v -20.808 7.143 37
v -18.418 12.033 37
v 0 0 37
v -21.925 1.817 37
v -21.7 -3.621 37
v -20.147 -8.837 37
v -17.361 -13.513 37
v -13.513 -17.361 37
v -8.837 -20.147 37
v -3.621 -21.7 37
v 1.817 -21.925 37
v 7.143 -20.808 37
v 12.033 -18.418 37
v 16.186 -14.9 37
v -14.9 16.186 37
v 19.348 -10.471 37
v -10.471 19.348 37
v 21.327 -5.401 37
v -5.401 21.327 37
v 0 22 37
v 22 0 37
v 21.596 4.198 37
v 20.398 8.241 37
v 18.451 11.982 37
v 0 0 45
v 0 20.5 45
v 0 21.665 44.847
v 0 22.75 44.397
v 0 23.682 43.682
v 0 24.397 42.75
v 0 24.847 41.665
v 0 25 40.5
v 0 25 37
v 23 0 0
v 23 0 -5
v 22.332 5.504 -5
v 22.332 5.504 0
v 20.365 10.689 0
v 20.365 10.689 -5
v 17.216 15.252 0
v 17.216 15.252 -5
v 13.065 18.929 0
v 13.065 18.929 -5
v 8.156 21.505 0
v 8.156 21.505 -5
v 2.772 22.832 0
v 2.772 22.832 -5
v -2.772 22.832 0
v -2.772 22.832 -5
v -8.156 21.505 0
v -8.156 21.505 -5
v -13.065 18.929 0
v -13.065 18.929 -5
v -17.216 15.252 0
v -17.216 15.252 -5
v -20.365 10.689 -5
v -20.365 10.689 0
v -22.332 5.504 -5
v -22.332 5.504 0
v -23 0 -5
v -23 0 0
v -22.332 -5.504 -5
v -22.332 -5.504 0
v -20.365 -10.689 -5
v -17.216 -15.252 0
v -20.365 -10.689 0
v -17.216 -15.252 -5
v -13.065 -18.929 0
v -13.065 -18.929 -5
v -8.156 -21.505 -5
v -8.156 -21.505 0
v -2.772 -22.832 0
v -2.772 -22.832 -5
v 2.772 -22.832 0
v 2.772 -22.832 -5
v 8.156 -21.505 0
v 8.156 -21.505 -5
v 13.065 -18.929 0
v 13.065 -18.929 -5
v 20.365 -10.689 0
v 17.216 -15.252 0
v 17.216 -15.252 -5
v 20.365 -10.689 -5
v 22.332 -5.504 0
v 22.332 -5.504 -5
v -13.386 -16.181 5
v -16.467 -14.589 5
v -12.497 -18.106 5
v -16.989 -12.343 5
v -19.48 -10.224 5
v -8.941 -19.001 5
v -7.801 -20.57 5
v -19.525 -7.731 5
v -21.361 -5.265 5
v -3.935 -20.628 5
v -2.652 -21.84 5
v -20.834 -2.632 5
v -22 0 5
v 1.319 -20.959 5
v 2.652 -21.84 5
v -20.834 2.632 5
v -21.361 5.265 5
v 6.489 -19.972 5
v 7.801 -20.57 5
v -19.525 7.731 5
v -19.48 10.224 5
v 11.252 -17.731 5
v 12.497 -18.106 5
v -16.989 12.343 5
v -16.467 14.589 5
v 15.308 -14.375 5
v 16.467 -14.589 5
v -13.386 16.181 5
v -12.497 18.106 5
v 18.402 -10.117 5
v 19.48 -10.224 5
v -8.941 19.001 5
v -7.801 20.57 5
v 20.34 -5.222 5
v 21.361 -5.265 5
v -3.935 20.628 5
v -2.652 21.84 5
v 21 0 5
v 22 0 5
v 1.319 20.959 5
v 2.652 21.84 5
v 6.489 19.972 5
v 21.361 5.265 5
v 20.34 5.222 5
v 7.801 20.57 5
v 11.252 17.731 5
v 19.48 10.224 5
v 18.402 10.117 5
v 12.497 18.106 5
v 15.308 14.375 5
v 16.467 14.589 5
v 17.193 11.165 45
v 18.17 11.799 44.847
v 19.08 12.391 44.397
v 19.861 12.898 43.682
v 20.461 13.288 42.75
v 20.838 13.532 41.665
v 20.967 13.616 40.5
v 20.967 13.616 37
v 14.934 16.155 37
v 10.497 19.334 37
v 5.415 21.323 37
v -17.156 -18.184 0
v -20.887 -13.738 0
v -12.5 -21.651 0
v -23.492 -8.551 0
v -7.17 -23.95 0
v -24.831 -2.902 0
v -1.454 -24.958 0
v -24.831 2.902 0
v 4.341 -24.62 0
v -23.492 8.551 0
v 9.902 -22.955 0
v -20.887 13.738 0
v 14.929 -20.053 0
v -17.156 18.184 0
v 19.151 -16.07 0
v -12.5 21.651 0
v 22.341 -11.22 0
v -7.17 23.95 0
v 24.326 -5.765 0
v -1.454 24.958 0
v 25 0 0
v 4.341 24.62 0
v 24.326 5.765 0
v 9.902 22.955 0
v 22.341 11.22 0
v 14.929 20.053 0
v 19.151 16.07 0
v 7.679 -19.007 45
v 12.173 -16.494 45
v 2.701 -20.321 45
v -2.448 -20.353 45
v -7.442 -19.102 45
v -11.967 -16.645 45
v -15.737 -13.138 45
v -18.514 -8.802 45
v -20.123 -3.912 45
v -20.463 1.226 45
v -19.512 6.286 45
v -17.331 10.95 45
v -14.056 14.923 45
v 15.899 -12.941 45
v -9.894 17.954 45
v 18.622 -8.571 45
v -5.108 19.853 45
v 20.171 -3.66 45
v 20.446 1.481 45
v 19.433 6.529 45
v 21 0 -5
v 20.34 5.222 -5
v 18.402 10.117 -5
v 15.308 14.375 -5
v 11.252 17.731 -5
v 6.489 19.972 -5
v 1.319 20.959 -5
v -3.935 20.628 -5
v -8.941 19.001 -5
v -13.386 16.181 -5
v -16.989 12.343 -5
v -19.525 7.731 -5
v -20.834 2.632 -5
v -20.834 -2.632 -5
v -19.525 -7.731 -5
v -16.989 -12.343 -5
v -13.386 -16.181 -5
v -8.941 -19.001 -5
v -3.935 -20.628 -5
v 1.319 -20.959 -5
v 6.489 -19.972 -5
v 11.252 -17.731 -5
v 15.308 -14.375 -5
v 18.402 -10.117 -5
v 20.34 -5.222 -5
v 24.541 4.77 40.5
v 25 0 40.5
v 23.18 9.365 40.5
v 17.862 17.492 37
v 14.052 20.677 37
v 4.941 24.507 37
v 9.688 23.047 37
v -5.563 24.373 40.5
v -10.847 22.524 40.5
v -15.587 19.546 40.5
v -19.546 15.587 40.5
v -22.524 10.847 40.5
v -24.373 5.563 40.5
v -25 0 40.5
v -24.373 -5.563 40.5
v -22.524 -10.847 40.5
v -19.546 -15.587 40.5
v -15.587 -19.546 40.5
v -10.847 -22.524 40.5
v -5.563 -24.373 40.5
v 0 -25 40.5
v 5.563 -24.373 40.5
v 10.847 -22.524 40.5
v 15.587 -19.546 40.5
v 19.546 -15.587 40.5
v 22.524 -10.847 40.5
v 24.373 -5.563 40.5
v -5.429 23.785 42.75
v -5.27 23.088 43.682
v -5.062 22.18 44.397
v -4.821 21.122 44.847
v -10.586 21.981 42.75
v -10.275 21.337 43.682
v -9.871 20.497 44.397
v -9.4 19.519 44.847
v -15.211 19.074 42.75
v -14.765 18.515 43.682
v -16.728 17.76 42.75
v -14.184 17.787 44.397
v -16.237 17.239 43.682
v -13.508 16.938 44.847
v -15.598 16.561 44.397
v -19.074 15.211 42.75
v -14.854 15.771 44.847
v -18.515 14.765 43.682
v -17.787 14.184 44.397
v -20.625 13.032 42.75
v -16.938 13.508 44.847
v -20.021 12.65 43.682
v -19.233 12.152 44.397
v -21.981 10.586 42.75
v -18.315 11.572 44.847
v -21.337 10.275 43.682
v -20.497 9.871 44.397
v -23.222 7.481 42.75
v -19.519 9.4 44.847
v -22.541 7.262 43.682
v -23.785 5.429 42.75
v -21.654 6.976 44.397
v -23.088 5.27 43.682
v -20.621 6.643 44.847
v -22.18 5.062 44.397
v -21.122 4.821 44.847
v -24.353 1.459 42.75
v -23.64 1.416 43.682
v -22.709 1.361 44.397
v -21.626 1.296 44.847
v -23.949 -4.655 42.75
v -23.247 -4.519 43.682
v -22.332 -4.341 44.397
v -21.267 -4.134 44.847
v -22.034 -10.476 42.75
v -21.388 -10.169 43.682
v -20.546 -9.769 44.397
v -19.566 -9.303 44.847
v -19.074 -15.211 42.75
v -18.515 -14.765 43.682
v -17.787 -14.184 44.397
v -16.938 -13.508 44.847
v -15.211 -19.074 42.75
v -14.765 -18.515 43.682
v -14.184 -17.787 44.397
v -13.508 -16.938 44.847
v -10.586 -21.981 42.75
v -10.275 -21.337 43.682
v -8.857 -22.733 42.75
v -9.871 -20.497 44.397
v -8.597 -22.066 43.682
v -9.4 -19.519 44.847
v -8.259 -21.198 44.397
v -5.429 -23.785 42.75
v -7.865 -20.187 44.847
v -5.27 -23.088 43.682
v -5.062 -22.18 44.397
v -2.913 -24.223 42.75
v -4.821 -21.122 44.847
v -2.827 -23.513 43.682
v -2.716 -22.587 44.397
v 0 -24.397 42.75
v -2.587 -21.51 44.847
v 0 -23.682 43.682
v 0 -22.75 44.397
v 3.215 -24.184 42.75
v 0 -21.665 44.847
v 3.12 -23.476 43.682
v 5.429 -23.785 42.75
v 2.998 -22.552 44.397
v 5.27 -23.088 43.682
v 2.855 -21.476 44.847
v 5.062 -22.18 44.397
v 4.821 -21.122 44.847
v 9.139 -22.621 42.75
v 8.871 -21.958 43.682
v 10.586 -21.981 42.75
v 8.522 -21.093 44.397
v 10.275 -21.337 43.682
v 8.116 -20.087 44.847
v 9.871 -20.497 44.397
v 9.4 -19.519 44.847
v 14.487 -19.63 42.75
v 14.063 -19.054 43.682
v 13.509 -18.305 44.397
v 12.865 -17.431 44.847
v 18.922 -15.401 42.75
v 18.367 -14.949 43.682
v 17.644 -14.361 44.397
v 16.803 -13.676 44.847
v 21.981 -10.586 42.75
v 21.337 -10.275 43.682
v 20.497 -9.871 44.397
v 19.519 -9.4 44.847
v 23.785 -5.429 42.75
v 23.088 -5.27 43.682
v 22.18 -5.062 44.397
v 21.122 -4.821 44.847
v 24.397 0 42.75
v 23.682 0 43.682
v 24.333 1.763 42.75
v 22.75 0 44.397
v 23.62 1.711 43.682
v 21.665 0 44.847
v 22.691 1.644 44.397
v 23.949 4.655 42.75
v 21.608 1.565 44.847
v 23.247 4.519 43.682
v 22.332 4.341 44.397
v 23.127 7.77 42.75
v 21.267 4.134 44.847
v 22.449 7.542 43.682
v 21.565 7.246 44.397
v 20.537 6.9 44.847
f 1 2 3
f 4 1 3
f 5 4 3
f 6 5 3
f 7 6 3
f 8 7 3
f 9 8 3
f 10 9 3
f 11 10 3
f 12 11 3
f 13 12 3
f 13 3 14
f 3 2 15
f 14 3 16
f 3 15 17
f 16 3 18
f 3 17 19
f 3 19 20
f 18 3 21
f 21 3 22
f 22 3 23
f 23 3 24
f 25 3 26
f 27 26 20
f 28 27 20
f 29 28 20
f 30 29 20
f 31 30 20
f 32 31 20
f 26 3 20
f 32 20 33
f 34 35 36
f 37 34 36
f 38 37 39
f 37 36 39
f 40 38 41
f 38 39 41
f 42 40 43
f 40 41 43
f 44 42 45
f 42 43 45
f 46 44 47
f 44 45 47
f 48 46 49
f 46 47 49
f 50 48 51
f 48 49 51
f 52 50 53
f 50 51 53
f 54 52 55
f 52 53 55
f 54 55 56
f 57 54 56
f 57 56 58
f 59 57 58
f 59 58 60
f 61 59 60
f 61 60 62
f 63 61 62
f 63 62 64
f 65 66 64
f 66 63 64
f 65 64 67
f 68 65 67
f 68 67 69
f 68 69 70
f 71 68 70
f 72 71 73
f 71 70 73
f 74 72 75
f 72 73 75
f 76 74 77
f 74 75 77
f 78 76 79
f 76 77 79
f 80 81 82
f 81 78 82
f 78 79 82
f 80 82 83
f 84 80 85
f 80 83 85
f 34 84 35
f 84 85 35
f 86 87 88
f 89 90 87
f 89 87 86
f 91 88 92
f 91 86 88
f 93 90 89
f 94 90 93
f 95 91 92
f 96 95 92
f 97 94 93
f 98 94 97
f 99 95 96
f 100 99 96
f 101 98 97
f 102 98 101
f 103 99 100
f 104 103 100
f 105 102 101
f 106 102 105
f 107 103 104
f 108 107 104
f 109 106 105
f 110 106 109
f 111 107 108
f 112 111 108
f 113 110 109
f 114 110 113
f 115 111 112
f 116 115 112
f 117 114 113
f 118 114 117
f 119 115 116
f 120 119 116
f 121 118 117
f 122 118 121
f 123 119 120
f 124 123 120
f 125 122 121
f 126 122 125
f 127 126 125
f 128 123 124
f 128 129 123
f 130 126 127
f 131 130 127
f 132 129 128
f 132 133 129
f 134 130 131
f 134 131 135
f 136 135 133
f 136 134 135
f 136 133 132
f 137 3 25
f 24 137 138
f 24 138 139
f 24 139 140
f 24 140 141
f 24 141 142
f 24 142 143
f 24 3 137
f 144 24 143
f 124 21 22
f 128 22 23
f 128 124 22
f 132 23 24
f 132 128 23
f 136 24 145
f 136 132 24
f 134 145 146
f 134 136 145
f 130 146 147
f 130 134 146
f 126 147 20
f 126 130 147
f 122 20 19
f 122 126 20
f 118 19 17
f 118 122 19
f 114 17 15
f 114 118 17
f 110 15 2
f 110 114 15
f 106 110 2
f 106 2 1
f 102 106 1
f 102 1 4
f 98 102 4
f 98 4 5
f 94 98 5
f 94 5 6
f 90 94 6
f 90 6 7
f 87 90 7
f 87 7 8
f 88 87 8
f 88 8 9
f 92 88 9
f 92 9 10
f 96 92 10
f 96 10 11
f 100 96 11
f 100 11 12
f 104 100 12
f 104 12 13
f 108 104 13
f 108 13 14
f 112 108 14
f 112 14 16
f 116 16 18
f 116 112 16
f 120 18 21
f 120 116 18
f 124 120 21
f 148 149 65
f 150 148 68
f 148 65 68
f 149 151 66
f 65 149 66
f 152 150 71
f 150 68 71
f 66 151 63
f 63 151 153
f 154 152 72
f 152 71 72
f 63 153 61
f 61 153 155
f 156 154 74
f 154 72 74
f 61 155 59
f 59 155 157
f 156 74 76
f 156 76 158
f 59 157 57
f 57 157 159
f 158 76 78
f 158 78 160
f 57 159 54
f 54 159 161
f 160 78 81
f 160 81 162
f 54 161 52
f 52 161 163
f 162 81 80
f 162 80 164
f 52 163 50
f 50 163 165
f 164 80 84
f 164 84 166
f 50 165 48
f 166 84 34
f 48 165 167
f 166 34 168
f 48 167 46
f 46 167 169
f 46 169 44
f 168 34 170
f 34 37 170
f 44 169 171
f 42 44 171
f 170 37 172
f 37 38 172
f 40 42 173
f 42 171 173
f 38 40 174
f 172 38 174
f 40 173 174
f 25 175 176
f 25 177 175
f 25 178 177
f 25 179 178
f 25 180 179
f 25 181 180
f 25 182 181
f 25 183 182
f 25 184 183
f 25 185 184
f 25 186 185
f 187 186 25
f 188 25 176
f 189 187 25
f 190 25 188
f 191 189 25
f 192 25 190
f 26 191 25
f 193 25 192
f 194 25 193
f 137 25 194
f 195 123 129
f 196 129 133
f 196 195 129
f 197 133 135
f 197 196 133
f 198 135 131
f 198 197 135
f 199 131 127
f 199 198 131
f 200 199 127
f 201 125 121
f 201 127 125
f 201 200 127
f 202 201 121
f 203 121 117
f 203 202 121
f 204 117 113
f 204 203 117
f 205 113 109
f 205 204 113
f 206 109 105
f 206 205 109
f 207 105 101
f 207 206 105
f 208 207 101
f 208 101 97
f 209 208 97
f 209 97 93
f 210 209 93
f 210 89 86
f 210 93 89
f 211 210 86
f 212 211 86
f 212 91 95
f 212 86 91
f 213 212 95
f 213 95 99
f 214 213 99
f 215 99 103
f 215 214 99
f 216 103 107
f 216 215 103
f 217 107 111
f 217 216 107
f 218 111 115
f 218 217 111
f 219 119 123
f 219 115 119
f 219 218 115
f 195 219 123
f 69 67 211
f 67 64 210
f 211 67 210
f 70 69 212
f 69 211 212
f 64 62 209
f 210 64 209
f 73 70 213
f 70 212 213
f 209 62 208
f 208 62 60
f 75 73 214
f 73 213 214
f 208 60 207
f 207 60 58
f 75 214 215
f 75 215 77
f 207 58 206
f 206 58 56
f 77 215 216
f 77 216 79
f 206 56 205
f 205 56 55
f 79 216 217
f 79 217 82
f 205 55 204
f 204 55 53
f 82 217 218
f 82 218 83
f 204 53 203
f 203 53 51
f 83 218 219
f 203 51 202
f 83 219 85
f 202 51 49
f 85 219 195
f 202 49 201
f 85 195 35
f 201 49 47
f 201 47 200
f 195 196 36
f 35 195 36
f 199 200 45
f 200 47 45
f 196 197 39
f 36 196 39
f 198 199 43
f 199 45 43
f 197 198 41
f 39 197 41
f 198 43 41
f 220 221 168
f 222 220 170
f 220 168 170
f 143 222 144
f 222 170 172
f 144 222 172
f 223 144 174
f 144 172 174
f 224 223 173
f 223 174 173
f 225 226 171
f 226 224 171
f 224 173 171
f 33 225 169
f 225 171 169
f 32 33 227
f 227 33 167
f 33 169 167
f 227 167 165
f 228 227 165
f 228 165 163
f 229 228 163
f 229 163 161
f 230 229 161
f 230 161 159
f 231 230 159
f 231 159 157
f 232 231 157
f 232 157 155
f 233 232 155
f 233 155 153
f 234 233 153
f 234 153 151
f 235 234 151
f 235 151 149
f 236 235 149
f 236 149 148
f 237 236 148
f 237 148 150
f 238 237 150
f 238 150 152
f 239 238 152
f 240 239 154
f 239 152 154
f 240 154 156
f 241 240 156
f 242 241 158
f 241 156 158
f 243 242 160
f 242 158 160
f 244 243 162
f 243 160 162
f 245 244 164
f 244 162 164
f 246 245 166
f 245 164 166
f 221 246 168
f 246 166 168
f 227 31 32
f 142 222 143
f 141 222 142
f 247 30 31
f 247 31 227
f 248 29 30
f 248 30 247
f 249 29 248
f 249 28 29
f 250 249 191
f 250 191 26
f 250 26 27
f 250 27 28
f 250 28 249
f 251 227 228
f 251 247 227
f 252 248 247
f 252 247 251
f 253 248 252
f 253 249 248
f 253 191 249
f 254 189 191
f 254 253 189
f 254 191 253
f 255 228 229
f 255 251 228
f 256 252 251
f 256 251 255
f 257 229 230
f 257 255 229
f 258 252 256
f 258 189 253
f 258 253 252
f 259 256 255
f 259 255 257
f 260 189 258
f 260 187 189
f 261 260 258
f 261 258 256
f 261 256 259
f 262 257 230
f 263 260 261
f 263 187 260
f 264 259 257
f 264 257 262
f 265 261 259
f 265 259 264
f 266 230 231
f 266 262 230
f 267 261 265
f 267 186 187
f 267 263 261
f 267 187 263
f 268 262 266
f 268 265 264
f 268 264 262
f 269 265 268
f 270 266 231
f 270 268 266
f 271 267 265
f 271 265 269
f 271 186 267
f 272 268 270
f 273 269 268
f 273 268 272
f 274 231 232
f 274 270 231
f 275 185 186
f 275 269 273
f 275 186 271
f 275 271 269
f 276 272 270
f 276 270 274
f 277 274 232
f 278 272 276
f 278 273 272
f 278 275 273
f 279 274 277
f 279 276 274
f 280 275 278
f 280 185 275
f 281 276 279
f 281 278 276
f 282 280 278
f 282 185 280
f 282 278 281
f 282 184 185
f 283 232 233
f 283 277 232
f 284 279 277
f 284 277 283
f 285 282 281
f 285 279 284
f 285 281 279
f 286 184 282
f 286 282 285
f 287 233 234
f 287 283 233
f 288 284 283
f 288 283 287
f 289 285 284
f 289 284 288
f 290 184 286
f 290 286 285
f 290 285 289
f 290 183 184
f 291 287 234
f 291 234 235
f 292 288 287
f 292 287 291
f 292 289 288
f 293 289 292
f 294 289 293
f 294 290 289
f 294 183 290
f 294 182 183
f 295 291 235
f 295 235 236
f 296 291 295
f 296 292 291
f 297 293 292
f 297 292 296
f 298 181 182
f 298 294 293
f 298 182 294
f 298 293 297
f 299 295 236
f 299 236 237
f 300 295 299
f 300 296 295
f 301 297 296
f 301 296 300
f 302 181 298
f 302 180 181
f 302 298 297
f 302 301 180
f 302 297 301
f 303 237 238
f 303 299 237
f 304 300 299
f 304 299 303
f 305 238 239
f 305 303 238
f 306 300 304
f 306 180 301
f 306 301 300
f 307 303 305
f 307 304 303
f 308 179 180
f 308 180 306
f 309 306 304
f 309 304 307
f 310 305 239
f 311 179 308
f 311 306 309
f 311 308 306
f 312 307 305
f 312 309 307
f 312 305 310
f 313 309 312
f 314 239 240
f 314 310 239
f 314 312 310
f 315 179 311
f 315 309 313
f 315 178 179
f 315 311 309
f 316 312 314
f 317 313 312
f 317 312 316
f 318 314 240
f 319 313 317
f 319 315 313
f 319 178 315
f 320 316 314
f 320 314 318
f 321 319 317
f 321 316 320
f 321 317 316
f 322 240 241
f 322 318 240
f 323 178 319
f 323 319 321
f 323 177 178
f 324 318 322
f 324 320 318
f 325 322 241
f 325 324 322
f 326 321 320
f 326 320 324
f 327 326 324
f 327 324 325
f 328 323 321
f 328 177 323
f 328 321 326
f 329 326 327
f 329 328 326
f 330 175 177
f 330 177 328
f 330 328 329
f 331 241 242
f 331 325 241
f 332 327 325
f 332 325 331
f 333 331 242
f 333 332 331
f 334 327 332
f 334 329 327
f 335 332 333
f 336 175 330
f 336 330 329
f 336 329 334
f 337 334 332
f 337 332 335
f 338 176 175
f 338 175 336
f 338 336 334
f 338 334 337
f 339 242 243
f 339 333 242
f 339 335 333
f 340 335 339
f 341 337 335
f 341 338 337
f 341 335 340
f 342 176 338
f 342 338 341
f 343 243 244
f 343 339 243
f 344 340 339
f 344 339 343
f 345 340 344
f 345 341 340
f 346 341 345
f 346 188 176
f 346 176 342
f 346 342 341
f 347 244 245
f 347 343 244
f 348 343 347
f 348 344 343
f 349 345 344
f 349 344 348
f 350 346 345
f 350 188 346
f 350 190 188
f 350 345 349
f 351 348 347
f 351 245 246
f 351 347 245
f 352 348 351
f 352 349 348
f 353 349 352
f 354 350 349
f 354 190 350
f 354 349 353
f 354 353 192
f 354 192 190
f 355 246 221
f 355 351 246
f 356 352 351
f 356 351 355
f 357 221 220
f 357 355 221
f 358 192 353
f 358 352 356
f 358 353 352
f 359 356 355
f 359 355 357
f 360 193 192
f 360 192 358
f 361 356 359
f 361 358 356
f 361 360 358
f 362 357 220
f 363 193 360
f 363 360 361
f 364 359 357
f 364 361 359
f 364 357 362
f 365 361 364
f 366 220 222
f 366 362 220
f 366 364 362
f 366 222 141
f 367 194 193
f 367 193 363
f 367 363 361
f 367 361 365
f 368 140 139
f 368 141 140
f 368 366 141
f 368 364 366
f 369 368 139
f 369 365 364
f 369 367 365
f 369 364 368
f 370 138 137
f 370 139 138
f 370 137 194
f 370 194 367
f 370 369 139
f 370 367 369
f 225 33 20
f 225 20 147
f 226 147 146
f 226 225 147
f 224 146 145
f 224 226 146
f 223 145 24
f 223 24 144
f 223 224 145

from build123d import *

# Parameters (mm, degrees)
BOX001_W               = 37
BOX001_H               = 39
BOX001_DEPTH           = 10
BOX001_PLACEMENT_ANGLE = 57
BOX_W                  = 37
BOX_H                  = 39
BOX_DEPTH              = 10
CYLINDER001_R          = 22
CYLINDER001_DEPTH      = 37
CYLINDER_R             = 25
CYLINDER_DEPTH         = 40
CYLINDER004_R          = 21
CYLINDER004_DEPTH      = 21
CYLINDER003_R          = 23
CYLINDER003_DEPTH      = 10
CYLINDER002_R          = 25
CYLINDER002_DEPTH      = 5
FILLET_R               = 4.5


with BuildPart() as cubo001:
    # Box001 → Box001 (new body)
    with BuildSketch(Plane.XY):
        with Locations((18.5, 19.5)):
            Rectangle(BOX001_W, BOX001_H)
    extrude(amount=BOX001_DEPTH)


with BuildPart() as cubo001_1:
    # Box001 placement: moved
    add(cubo001.part.moved(Location((0, 0, 37))).rotate(Axis((0, 0, 37), (0, 0, -1)), BOX001_PLACEMENT_ANGLE))


with BuildPart() as cut002:
    # Box → Box (new body)
    with BuildSketch(Plane.XY.offset(37)):
        with Locations((18.5, 19.5)):
            Rectangle(BOX_W, BOX_H)
    extrude(amount=BOX_DEPTH)

    # Cut002: cut Cubo001
    add(cubo001_1.part, mode=Mode.SUBTRACT)


with BuildPart() as cilindro001:
    # Cylinder001 → Cylinder001 (new body)
    with BuildSketch(Plane.XY):
        Circle(CYLINDER001_R)
    extrude(amount=CYLINDER001_DEPTH)


with BuildPart() as cut:
    # Cylinder → Cylinder (new body)
    with BuildSketch(Plane.XY):
        Circle(CYLINDER_R)
    extrude(amount=CYLINDER_DEPTH)

    # Cut: cut Cilindro001
    add(cilindro001.part, mode=Mode.SUBTRACT)


with BuildPart() as cilindro004:
    # Cylinder004 → Cylinder004 (new body)
    with BuildSketch(Plane.XY):
        Circle(CYLINDER004_R)
    extrude(amount=CYLINDER004_DEPTH)


with BuildPart() as cut001:
    # Cylinder003 → Cylinder003 (new body)
    with BuildSketch(Plane.XY):
        Circle(CYLINDER003_R)
    extrude(amount=CYLINDER003_DEPTH)

    # Cut001: cut Cilindro004
    add(cilindro004.part, mode=Mode.SUBTRACT)


with BuildPart() as cut001_1:
    # Cut001 placement: moved
    add(cut001.part.moved(Location((0, 0, -5))))


with BuildPart() as cut003:
    # Cylinder002 → Cylinder002 (new body)
    with BuildSketch(Plane.XY.offset(40)):
        Circle(CYLINDER002_R)
    extrude(amount=CYLINDER002_DEPTH)

    # Fillet
    fillet_edges = [cut003.edges().sort_by_distance(p)[0] for p in [
        (-25, 0, 45),
    ]]
    fillet(fillet_edges, radius=FILLET_R)

    # Fusion: union Cut, Cut001
    add(cut.part)
    add(cut001_1.part)

    # Cut003: cut Cut002
    add(cut002.part, mode=Mode.SUBTRACT)


solid = cut003.part
